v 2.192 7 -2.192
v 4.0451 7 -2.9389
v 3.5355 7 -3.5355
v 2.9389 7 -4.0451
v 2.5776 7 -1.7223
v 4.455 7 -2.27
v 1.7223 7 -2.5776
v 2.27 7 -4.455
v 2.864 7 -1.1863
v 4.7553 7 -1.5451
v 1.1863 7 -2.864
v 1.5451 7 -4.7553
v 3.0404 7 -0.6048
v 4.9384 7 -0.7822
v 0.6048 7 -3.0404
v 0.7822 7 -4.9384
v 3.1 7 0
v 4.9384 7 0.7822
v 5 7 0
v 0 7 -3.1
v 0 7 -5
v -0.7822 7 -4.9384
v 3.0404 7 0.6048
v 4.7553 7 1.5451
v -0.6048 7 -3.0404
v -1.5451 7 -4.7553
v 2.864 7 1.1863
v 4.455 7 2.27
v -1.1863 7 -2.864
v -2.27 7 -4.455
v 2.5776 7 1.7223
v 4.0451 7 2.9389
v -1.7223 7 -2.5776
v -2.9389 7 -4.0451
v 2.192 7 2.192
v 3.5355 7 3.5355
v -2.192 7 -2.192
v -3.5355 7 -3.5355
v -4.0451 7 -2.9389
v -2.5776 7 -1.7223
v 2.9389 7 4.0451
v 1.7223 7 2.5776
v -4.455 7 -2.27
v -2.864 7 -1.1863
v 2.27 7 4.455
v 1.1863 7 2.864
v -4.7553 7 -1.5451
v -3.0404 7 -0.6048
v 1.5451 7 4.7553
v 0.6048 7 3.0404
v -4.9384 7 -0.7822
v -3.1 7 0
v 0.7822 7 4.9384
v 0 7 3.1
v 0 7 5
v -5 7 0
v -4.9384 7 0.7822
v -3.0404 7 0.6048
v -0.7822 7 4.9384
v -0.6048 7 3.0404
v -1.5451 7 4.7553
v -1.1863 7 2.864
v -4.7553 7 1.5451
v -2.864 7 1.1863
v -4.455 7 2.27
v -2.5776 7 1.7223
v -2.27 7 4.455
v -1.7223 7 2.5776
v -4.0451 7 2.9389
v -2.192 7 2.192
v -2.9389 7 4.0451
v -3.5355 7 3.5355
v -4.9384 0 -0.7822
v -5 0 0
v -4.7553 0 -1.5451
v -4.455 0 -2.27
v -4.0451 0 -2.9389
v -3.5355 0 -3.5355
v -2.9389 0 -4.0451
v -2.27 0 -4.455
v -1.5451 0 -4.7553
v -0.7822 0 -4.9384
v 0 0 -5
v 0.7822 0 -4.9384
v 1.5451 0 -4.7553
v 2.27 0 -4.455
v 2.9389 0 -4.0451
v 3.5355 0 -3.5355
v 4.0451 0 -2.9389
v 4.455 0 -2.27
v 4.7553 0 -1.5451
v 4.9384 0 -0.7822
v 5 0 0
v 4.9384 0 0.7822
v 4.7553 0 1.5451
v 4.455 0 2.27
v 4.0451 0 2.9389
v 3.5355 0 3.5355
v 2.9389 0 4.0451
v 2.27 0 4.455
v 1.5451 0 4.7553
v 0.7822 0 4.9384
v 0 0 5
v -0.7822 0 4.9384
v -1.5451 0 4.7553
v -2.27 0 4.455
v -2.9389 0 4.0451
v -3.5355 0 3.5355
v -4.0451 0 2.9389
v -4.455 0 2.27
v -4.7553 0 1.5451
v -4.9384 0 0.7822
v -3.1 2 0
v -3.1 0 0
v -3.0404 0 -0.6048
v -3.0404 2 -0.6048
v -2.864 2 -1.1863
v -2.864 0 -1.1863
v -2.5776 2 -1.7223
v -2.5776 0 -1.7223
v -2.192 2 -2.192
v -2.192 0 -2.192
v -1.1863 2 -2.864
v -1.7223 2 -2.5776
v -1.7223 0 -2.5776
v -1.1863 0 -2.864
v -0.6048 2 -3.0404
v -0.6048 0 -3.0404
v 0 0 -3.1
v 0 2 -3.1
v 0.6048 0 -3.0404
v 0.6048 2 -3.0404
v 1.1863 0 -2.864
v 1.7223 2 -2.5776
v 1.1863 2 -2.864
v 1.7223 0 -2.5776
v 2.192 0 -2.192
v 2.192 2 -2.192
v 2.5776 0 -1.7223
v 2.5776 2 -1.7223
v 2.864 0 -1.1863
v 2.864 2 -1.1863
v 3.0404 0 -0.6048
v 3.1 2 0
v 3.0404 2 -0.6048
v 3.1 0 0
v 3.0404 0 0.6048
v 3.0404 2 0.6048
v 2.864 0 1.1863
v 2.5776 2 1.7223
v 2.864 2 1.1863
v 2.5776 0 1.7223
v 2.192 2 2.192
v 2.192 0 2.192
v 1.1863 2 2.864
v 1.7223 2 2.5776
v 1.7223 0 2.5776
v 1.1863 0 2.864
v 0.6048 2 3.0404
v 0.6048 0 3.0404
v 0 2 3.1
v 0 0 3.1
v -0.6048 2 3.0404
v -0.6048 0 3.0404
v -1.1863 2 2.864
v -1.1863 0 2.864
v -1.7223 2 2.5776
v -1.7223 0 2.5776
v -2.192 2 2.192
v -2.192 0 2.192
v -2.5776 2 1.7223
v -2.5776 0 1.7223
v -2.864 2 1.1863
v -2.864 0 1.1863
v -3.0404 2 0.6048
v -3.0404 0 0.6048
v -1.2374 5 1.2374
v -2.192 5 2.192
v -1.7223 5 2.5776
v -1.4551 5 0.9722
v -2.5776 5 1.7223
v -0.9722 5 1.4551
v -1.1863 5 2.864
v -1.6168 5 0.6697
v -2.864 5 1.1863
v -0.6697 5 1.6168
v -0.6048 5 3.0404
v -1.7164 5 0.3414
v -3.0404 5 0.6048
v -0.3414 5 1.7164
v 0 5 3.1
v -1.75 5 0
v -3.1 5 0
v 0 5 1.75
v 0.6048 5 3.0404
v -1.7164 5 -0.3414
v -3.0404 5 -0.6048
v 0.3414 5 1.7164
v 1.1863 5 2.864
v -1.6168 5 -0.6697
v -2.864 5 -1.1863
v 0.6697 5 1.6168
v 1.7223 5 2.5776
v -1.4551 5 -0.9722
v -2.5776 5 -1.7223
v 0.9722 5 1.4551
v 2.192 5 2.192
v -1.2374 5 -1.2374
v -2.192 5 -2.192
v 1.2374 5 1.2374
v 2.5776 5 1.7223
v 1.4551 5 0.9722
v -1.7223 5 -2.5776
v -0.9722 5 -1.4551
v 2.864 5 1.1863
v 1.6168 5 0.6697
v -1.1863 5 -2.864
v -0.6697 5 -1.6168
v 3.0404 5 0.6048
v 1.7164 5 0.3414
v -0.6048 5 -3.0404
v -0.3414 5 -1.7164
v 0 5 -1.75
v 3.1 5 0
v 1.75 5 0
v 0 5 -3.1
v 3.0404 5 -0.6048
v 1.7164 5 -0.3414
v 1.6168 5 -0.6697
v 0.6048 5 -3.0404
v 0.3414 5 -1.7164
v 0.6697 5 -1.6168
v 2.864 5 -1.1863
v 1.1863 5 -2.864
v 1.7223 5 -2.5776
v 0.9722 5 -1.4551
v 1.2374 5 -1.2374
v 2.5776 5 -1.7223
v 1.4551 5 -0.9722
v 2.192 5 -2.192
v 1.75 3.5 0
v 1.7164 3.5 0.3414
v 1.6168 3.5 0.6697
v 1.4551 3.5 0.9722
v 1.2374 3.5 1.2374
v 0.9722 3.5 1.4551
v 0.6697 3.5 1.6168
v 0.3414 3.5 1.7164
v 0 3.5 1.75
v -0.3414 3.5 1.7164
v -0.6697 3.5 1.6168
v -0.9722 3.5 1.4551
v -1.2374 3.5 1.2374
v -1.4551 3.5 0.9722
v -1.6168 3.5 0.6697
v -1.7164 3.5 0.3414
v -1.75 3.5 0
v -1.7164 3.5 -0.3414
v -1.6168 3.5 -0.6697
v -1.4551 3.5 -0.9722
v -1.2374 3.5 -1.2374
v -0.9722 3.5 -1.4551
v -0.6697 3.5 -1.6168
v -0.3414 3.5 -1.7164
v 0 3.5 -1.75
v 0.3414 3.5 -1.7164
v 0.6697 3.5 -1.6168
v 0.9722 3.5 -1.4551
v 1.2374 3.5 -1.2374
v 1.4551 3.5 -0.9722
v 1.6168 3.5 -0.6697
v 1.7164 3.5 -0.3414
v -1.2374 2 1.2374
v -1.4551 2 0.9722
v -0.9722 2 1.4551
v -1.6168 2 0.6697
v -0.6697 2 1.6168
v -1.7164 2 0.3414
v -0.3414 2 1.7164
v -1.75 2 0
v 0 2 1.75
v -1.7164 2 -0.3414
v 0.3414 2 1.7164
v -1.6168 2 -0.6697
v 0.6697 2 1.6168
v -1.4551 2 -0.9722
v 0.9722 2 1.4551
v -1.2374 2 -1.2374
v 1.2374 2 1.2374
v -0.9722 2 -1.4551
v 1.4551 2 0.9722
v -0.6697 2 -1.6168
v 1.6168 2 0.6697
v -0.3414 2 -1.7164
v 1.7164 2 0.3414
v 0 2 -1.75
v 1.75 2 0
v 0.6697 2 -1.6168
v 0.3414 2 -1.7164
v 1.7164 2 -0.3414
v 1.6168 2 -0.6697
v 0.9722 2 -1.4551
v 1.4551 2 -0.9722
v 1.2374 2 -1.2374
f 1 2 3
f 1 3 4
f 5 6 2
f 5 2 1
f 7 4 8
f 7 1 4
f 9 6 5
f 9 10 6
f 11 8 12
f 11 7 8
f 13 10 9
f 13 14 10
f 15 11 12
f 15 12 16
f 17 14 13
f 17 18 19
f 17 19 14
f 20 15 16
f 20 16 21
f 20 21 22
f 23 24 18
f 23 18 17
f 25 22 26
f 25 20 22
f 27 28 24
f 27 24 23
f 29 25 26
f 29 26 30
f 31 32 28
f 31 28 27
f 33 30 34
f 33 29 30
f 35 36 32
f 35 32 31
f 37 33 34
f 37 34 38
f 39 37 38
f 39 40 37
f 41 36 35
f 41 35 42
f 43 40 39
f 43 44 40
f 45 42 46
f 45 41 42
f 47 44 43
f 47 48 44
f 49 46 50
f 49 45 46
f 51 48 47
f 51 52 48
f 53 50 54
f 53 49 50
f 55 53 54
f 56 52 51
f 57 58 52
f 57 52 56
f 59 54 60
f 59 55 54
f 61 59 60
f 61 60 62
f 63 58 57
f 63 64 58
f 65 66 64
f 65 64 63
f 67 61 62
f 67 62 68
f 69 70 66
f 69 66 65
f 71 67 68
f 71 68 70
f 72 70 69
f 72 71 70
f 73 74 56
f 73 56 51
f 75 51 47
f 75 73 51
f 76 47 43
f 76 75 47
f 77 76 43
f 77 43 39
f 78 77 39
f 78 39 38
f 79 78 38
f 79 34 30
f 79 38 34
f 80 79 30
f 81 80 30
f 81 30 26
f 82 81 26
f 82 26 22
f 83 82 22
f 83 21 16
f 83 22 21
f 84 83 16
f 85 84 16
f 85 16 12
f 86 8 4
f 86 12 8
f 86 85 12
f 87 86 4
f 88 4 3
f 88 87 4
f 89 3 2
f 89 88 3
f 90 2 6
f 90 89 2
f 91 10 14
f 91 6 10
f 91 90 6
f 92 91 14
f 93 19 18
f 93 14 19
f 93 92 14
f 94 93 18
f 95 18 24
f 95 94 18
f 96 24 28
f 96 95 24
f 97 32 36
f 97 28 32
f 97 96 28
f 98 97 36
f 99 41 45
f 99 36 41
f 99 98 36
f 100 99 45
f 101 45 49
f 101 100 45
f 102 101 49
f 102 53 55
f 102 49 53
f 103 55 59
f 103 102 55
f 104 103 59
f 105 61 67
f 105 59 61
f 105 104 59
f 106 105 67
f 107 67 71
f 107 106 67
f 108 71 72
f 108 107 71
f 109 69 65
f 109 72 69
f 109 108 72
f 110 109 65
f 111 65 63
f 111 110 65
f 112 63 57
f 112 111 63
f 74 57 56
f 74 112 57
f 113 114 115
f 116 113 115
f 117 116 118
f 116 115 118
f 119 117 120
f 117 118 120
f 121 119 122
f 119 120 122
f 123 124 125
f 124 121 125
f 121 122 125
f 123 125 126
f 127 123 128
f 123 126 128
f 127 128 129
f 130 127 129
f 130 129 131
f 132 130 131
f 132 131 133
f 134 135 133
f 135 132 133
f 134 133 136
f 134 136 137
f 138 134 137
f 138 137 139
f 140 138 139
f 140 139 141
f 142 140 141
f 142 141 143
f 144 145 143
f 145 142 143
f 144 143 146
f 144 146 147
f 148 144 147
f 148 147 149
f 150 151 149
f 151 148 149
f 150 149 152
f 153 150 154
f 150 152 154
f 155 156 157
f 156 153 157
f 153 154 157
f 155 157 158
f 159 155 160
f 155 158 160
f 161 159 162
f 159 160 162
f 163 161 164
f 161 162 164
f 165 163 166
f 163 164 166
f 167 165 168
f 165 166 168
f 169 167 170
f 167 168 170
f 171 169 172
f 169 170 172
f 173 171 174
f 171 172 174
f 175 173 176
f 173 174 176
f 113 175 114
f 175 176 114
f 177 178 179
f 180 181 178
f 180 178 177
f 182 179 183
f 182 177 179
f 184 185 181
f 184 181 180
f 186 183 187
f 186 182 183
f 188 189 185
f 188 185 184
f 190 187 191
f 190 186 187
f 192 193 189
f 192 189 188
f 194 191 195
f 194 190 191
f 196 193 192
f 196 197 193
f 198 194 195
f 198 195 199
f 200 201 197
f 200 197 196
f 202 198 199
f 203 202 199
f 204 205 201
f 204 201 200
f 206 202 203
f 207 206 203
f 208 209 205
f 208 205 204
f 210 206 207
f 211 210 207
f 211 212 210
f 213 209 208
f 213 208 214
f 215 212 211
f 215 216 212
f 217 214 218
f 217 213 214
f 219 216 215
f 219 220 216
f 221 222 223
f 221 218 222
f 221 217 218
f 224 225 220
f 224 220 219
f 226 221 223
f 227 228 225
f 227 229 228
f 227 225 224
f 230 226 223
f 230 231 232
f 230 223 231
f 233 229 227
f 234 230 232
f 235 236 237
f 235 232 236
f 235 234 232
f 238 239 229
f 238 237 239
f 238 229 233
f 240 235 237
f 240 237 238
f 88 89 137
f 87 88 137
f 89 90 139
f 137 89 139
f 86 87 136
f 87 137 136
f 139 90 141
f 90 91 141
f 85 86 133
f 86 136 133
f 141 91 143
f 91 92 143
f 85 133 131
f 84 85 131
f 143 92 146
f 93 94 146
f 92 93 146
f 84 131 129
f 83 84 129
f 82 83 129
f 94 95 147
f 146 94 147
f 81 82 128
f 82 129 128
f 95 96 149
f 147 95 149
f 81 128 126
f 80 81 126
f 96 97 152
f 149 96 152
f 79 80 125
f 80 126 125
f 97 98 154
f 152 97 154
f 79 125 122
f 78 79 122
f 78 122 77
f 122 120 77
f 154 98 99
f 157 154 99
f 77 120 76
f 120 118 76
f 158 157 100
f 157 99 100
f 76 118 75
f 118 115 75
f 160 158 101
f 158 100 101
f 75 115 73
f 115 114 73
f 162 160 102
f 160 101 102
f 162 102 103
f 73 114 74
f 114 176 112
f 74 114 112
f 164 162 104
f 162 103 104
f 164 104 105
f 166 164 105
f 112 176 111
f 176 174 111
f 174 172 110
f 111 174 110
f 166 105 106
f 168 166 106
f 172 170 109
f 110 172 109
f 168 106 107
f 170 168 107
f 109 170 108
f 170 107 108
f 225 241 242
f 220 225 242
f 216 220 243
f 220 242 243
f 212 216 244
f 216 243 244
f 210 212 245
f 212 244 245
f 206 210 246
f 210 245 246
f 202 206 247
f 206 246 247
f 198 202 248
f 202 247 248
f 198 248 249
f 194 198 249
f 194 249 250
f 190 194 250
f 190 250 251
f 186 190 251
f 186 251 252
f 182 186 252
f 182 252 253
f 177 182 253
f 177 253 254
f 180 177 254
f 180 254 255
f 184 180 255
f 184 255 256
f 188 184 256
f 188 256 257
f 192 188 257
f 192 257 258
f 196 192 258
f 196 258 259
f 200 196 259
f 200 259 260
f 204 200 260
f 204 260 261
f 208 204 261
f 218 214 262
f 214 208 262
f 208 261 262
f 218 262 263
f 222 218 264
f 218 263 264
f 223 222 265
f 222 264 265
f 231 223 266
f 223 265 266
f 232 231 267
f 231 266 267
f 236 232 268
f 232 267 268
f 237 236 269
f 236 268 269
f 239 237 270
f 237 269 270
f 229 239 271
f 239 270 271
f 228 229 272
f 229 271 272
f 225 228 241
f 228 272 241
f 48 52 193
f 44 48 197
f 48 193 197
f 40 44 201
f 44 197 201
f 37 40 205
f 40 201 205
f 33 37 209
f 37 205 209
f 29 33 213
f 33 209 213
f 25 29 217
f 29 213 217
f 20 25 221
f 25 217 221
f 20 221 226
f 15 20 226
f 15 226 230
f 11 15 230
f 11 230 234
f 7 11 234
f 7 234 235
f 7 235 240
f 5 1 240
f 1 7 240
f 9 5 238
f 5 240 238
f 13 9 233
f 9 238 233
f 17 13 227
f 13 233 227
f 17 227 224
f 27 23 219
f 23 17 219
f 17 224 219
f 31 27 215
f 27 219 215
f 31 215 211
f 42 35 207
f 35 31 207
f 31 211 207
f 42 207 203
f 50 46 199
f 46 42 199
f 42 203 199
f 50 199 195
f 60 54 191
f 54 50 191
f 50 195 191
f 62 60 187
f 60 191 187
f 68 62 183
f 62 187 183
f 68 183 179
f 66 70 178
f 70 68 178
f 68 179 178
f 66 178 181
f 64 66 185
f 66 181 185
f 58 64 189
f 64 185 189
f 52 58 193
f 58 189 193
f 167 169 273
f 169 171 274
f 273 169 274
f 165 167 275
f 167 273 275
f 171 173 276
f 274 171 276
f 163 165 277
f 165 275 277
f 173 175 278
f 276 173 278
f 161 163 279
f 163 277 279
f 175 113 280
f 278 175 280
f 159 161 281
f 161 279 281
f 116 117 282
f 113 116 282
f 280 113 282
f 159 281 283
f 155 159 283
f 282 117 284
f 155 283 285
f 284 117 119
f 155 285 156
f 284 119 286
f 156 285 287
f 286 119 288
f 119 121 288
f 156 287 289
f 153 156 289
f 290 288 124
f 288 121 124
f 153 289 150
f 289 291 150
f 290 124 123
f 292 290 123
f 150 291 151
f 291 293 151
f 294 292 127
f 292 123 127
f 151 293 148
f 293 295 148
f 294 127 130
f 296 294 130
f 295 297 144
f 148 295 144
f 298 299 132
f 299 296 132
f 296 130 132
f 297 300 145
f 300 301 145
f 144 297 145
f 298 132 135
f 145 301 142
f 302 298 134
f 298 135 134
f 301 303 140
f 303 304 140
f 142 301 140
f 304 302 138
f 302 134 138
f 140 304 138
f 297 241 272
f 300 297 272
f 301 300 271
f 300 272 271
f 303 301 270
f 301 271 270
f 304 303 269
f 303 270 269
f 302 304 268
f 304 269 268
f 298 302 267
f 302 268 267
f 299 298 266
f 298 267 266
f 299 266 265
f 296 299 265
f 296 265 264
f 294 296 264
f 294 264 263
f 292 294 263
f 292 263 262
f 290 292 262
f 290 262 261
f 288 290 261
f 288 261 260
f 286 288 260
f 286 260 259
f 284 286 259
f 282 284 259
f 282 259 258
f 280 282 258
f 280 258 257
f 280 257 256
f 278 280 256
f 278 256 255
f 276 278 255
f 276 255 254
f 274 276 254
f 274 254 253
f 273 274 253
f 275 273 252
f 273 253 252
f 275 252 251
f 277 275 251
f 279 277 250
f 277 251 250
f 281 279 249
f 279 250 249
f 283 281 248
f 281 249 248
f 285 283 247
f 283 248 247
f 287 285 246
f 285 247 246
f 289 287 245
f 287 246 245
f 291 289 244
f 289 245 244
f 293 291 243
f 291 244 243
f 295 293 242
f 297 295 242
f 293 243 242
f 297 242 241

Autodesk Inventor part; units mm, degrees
ref_plane "YZ Plane" through (0, 0, 0) normal (1, 0, 0) x (0, 1, 0)
ref_plane "XZ Plane" through (0, 0, 0) normal (0, 1, 0) x (-1, 0, 0)
sketch "スケッチ1" plane through (0, 0, 0) normal (0, 1, 0) x (-1, 0, 0)
  circle A0 centre (0, 0) radius 5
  circle A1 centre (0, 0) radius 3.1
  dimension "d0" = 10
  dimension "d8" = 6.2
extrude "押し出し1" add sketch "スケッチ1" along normal blind 7
ref_plane "作業平面1" through (0, 3.5, 0) normal (0, 1, 0) x (1, 0, 0)
sketch "スケッチ5" plane through (0, 3.5, 0) normal (0, 1, 0) x (1, 0, 0)
  circle A0 centre (0, 0) radius 1.75
  circle A1 centre (0, 0) radius 3.1 projected
  dimension "d9" = 3.5
extrude "押し出し4" add sketch "スケッチ5" along normal mid plane 3
properties part number "belt_roller_outside"
